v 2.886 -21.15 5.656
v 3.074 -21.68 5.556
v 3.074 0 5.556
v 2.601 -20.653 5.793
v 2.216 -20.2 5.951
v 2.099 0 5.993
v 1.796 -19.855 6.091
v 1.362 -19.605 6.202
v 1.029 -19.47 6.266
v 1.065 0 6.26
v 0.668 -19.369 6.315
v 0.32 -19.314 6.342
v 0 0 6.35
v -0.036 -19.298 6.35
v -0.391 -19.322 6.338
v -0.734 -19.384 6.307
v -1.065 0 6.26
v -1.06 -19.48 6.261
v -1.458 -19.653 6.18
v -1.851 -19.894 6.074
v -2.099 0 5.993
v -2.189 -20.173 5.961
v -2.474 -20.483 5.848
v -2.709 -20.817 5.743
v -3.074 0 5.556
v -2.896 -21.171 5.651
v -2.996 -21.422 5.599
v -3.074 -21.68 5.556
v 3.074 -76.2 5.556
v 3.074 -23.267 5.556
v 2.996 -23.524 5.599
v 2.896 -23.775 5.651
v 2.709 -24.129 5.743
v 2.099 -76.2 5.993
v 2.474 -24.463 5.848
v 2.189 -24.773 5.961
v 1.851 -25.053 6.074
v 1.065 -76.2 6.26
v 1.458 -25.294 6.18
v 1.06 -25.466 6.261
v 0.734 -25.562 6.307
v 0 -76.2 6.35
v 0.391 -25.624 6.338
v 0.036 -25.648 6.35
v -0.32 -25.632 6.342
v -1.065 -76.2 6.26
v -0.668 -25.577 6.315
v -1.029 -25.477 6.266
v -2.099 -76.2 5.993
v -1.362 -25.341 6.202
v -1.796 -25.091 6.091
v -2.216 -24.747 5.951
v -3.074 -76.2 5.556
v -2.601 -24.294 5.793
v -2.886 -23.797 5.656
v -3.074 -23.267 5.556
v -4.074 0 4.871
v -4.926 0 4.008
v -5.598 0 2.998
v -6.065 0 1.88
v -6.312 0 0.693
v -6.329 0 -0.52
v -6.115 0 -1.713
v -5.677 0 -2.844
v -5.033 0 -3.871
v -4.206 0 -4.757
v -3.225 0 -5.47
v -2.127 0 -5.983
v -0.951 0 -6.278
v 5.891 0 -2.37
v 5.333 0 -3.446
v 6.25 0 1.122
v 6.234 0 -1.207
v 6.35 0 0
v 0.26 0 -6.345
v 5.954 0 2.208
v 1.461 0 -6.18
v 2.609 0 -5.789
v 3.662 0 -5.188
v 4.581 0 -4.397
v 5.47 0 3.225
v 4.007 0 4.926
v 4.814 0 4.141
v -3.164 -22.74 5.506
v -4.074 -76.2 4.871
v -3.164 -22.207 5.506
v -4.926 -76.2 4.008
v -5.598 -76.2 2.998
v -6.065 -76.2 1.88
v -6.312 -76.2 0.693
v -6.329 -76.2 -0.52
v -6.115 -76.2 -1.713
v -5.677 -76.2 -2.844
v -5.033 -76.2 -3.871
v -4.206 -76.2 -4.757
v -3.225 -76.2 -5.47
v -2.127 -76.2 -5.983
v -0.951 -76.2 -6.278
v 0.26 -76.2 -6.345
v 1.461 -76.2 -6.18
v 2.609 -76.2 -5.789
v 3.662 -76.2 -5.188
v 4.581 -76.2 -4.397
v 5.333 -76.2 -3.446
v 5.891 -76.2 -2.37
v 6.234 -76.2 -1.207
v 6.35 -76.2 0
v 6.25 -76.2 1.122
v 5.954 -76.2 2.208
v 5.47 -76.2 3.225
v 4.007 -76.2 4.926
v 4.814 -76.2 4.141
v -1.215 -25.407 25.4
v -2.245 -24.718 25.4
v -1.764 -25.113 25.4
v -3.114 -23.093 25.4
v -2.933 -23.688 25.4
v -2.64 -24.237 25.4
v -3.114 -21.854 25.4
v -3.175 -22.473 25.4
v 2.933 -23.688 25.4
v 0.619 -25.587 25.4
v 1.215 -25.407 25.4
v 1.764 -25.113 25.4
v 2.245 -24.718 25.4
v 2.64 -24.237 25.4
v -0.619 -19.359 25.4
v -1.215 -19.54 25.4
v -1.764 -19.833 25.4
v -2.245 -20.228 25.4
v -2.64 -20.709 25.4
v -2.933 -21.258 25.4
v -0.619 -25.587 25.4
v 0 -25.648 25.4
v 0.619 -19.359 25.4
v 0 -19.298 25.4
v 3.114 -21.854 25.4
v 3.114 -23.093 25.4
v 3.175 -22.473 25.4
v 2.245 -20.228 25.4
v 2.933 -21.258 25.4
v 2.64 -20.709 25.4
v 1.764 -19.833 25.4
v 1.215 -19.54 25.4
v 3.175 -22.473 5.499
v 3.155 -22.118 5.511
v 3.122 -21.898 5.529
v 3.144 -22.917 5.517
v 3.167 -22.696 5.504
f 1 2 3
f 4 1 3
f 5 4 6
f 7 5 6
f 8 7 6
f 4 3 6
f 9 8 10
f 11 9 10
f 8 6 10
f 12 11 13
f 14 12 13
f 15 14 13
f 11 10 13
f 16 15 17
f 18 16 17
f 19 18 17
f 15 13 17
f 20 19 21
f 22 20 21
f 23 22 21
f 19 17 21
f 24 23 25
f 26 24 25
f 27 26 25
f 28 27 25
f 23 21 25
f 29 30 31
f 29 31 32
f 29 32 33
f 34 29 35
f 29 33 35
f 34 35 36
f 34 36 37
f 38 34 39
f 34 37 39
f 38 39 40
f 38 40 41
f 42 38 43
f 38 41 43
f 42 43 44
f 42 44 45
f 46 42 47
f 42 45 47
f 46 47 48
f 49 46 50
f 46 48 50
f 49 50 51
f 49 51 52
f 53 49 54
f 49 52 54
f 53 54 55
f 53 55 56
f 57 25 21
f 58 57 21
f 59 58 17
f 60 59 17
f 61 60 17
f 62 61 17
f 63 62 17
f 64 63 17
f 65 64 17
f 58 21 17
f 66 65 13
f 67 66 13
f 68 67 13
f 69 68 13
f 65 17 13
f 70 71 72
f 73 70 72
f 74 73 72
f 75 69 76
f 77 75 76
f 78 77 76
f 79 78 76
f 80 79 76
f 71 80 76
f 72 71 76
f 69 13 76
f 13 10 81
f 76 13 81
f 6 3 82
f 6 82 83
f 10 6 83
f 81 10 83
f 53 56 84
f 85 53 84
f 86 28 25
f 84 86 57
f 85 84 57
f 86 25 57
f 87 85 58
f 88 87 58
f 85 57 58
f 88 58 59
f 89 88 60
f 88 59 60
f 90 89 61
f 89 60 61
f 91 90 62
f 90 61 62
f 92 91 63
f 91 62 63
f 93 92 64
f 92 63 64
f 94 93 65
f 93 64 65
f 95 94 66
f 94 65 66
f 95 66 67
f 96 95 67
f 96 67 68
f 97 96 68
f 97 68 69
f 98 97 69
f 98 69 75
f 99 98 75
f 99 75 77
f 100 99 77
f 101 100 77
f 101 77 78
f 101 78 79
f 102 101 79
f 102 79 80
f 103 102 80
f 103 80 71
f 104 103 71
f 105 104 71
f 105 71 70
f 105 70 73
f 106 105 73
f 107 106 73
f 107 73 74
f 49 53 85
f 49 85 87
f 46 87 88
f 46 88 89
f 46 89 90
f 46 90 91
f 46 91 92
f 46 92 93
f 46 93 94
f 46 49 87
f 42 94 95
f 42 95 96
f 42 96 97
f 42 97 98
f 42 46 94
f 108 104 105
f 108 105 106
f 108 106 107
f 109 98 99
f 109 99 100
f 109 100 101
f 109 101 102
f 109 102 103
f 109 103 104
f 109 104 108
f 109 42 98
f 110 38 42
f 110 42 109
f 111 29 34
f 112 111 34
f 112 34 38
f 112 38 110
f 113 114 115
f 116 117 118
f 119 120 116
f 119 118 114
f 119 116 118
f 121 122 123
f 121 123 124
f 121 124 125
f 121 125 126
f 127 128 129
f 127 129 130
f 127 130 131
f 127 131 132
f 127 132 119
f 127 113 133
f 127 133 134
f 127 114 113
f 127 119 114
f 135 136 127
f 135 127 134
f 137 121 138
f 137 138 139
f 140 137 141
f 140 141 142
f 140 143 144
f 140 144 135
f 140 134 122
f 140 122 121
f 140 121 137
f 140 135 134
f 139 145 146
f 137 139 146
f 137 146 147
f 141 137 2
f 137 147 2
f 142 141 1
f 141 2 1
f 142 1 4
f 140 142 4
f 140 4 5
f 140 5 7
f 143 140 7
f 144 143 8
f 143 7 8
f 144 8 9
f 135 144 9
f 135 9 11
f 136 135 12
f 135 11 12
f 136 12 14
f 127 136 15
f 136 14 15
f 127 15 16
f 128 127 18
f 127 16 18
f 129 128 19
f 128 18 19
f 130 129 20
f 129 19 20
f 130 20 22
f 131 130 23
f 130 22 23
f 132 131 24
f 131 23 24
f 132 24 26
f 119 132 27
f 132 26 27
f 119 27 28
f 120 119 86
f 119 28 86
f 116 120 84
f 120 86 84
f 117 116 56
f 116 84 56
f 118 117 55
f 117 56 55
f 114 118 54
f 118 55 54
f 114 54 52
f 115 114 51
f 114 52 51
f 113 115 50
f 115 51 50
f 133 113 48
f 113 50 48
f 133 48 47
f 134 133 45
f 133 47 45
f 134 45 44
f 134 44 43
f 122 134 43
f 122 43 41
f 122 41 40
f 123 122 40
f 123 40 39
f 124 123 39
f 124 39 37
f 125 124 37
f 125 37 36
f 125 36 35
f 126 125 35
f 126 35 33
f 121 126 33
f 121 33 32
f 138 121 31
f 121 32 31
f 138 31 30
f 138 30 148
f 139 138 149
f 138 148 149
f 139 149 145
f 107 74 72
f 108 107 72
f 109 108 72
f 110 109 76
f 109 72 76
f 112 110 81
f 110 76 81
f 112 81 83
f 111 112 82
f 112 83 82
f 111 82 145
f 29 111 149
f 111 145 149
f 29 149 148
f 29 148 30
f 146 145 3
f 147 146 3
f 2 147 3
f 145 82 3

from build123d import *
from build123d import SkipClean  # not in build123d's __all__

# Parameters (mm, degrees)
F1_DEPTH = 76.2
F2_R     = 3.175
F3_DEPTH = 25.4


with BuildPart() as f1:
    # F0 (on Front) → F1 (new body)
    with BuildSketch(Plane.XZ):
        with BuildLine():
            ThreePointArc((-3.0741805311, 5.55625), (-3.2250157851, -5.4700798153), (6.35, 0))
            ThreePointArc((6.35, 0), (5.4700798153, 3.2250157851), (3.0741805311, 5.55625))
            ThreePointArc((3.0741805311, 5.55625), (0, 6.35), (-3.0741805311, 5.55625))
        make_face()
    extrude(amount=F1_DEPTH)

    # F2 (on Top) → F3 (join)
    with BuildSketch(Plane.XY):
        with Locations((0, -22.4732574466)):
            Circle(F2_R)
    with SkipClean():  # cleaning this boolean's faces spoils the solid; the shape is the same uncleaned
        extrude(amount=F3_DEPTH)


solid = f1.part
